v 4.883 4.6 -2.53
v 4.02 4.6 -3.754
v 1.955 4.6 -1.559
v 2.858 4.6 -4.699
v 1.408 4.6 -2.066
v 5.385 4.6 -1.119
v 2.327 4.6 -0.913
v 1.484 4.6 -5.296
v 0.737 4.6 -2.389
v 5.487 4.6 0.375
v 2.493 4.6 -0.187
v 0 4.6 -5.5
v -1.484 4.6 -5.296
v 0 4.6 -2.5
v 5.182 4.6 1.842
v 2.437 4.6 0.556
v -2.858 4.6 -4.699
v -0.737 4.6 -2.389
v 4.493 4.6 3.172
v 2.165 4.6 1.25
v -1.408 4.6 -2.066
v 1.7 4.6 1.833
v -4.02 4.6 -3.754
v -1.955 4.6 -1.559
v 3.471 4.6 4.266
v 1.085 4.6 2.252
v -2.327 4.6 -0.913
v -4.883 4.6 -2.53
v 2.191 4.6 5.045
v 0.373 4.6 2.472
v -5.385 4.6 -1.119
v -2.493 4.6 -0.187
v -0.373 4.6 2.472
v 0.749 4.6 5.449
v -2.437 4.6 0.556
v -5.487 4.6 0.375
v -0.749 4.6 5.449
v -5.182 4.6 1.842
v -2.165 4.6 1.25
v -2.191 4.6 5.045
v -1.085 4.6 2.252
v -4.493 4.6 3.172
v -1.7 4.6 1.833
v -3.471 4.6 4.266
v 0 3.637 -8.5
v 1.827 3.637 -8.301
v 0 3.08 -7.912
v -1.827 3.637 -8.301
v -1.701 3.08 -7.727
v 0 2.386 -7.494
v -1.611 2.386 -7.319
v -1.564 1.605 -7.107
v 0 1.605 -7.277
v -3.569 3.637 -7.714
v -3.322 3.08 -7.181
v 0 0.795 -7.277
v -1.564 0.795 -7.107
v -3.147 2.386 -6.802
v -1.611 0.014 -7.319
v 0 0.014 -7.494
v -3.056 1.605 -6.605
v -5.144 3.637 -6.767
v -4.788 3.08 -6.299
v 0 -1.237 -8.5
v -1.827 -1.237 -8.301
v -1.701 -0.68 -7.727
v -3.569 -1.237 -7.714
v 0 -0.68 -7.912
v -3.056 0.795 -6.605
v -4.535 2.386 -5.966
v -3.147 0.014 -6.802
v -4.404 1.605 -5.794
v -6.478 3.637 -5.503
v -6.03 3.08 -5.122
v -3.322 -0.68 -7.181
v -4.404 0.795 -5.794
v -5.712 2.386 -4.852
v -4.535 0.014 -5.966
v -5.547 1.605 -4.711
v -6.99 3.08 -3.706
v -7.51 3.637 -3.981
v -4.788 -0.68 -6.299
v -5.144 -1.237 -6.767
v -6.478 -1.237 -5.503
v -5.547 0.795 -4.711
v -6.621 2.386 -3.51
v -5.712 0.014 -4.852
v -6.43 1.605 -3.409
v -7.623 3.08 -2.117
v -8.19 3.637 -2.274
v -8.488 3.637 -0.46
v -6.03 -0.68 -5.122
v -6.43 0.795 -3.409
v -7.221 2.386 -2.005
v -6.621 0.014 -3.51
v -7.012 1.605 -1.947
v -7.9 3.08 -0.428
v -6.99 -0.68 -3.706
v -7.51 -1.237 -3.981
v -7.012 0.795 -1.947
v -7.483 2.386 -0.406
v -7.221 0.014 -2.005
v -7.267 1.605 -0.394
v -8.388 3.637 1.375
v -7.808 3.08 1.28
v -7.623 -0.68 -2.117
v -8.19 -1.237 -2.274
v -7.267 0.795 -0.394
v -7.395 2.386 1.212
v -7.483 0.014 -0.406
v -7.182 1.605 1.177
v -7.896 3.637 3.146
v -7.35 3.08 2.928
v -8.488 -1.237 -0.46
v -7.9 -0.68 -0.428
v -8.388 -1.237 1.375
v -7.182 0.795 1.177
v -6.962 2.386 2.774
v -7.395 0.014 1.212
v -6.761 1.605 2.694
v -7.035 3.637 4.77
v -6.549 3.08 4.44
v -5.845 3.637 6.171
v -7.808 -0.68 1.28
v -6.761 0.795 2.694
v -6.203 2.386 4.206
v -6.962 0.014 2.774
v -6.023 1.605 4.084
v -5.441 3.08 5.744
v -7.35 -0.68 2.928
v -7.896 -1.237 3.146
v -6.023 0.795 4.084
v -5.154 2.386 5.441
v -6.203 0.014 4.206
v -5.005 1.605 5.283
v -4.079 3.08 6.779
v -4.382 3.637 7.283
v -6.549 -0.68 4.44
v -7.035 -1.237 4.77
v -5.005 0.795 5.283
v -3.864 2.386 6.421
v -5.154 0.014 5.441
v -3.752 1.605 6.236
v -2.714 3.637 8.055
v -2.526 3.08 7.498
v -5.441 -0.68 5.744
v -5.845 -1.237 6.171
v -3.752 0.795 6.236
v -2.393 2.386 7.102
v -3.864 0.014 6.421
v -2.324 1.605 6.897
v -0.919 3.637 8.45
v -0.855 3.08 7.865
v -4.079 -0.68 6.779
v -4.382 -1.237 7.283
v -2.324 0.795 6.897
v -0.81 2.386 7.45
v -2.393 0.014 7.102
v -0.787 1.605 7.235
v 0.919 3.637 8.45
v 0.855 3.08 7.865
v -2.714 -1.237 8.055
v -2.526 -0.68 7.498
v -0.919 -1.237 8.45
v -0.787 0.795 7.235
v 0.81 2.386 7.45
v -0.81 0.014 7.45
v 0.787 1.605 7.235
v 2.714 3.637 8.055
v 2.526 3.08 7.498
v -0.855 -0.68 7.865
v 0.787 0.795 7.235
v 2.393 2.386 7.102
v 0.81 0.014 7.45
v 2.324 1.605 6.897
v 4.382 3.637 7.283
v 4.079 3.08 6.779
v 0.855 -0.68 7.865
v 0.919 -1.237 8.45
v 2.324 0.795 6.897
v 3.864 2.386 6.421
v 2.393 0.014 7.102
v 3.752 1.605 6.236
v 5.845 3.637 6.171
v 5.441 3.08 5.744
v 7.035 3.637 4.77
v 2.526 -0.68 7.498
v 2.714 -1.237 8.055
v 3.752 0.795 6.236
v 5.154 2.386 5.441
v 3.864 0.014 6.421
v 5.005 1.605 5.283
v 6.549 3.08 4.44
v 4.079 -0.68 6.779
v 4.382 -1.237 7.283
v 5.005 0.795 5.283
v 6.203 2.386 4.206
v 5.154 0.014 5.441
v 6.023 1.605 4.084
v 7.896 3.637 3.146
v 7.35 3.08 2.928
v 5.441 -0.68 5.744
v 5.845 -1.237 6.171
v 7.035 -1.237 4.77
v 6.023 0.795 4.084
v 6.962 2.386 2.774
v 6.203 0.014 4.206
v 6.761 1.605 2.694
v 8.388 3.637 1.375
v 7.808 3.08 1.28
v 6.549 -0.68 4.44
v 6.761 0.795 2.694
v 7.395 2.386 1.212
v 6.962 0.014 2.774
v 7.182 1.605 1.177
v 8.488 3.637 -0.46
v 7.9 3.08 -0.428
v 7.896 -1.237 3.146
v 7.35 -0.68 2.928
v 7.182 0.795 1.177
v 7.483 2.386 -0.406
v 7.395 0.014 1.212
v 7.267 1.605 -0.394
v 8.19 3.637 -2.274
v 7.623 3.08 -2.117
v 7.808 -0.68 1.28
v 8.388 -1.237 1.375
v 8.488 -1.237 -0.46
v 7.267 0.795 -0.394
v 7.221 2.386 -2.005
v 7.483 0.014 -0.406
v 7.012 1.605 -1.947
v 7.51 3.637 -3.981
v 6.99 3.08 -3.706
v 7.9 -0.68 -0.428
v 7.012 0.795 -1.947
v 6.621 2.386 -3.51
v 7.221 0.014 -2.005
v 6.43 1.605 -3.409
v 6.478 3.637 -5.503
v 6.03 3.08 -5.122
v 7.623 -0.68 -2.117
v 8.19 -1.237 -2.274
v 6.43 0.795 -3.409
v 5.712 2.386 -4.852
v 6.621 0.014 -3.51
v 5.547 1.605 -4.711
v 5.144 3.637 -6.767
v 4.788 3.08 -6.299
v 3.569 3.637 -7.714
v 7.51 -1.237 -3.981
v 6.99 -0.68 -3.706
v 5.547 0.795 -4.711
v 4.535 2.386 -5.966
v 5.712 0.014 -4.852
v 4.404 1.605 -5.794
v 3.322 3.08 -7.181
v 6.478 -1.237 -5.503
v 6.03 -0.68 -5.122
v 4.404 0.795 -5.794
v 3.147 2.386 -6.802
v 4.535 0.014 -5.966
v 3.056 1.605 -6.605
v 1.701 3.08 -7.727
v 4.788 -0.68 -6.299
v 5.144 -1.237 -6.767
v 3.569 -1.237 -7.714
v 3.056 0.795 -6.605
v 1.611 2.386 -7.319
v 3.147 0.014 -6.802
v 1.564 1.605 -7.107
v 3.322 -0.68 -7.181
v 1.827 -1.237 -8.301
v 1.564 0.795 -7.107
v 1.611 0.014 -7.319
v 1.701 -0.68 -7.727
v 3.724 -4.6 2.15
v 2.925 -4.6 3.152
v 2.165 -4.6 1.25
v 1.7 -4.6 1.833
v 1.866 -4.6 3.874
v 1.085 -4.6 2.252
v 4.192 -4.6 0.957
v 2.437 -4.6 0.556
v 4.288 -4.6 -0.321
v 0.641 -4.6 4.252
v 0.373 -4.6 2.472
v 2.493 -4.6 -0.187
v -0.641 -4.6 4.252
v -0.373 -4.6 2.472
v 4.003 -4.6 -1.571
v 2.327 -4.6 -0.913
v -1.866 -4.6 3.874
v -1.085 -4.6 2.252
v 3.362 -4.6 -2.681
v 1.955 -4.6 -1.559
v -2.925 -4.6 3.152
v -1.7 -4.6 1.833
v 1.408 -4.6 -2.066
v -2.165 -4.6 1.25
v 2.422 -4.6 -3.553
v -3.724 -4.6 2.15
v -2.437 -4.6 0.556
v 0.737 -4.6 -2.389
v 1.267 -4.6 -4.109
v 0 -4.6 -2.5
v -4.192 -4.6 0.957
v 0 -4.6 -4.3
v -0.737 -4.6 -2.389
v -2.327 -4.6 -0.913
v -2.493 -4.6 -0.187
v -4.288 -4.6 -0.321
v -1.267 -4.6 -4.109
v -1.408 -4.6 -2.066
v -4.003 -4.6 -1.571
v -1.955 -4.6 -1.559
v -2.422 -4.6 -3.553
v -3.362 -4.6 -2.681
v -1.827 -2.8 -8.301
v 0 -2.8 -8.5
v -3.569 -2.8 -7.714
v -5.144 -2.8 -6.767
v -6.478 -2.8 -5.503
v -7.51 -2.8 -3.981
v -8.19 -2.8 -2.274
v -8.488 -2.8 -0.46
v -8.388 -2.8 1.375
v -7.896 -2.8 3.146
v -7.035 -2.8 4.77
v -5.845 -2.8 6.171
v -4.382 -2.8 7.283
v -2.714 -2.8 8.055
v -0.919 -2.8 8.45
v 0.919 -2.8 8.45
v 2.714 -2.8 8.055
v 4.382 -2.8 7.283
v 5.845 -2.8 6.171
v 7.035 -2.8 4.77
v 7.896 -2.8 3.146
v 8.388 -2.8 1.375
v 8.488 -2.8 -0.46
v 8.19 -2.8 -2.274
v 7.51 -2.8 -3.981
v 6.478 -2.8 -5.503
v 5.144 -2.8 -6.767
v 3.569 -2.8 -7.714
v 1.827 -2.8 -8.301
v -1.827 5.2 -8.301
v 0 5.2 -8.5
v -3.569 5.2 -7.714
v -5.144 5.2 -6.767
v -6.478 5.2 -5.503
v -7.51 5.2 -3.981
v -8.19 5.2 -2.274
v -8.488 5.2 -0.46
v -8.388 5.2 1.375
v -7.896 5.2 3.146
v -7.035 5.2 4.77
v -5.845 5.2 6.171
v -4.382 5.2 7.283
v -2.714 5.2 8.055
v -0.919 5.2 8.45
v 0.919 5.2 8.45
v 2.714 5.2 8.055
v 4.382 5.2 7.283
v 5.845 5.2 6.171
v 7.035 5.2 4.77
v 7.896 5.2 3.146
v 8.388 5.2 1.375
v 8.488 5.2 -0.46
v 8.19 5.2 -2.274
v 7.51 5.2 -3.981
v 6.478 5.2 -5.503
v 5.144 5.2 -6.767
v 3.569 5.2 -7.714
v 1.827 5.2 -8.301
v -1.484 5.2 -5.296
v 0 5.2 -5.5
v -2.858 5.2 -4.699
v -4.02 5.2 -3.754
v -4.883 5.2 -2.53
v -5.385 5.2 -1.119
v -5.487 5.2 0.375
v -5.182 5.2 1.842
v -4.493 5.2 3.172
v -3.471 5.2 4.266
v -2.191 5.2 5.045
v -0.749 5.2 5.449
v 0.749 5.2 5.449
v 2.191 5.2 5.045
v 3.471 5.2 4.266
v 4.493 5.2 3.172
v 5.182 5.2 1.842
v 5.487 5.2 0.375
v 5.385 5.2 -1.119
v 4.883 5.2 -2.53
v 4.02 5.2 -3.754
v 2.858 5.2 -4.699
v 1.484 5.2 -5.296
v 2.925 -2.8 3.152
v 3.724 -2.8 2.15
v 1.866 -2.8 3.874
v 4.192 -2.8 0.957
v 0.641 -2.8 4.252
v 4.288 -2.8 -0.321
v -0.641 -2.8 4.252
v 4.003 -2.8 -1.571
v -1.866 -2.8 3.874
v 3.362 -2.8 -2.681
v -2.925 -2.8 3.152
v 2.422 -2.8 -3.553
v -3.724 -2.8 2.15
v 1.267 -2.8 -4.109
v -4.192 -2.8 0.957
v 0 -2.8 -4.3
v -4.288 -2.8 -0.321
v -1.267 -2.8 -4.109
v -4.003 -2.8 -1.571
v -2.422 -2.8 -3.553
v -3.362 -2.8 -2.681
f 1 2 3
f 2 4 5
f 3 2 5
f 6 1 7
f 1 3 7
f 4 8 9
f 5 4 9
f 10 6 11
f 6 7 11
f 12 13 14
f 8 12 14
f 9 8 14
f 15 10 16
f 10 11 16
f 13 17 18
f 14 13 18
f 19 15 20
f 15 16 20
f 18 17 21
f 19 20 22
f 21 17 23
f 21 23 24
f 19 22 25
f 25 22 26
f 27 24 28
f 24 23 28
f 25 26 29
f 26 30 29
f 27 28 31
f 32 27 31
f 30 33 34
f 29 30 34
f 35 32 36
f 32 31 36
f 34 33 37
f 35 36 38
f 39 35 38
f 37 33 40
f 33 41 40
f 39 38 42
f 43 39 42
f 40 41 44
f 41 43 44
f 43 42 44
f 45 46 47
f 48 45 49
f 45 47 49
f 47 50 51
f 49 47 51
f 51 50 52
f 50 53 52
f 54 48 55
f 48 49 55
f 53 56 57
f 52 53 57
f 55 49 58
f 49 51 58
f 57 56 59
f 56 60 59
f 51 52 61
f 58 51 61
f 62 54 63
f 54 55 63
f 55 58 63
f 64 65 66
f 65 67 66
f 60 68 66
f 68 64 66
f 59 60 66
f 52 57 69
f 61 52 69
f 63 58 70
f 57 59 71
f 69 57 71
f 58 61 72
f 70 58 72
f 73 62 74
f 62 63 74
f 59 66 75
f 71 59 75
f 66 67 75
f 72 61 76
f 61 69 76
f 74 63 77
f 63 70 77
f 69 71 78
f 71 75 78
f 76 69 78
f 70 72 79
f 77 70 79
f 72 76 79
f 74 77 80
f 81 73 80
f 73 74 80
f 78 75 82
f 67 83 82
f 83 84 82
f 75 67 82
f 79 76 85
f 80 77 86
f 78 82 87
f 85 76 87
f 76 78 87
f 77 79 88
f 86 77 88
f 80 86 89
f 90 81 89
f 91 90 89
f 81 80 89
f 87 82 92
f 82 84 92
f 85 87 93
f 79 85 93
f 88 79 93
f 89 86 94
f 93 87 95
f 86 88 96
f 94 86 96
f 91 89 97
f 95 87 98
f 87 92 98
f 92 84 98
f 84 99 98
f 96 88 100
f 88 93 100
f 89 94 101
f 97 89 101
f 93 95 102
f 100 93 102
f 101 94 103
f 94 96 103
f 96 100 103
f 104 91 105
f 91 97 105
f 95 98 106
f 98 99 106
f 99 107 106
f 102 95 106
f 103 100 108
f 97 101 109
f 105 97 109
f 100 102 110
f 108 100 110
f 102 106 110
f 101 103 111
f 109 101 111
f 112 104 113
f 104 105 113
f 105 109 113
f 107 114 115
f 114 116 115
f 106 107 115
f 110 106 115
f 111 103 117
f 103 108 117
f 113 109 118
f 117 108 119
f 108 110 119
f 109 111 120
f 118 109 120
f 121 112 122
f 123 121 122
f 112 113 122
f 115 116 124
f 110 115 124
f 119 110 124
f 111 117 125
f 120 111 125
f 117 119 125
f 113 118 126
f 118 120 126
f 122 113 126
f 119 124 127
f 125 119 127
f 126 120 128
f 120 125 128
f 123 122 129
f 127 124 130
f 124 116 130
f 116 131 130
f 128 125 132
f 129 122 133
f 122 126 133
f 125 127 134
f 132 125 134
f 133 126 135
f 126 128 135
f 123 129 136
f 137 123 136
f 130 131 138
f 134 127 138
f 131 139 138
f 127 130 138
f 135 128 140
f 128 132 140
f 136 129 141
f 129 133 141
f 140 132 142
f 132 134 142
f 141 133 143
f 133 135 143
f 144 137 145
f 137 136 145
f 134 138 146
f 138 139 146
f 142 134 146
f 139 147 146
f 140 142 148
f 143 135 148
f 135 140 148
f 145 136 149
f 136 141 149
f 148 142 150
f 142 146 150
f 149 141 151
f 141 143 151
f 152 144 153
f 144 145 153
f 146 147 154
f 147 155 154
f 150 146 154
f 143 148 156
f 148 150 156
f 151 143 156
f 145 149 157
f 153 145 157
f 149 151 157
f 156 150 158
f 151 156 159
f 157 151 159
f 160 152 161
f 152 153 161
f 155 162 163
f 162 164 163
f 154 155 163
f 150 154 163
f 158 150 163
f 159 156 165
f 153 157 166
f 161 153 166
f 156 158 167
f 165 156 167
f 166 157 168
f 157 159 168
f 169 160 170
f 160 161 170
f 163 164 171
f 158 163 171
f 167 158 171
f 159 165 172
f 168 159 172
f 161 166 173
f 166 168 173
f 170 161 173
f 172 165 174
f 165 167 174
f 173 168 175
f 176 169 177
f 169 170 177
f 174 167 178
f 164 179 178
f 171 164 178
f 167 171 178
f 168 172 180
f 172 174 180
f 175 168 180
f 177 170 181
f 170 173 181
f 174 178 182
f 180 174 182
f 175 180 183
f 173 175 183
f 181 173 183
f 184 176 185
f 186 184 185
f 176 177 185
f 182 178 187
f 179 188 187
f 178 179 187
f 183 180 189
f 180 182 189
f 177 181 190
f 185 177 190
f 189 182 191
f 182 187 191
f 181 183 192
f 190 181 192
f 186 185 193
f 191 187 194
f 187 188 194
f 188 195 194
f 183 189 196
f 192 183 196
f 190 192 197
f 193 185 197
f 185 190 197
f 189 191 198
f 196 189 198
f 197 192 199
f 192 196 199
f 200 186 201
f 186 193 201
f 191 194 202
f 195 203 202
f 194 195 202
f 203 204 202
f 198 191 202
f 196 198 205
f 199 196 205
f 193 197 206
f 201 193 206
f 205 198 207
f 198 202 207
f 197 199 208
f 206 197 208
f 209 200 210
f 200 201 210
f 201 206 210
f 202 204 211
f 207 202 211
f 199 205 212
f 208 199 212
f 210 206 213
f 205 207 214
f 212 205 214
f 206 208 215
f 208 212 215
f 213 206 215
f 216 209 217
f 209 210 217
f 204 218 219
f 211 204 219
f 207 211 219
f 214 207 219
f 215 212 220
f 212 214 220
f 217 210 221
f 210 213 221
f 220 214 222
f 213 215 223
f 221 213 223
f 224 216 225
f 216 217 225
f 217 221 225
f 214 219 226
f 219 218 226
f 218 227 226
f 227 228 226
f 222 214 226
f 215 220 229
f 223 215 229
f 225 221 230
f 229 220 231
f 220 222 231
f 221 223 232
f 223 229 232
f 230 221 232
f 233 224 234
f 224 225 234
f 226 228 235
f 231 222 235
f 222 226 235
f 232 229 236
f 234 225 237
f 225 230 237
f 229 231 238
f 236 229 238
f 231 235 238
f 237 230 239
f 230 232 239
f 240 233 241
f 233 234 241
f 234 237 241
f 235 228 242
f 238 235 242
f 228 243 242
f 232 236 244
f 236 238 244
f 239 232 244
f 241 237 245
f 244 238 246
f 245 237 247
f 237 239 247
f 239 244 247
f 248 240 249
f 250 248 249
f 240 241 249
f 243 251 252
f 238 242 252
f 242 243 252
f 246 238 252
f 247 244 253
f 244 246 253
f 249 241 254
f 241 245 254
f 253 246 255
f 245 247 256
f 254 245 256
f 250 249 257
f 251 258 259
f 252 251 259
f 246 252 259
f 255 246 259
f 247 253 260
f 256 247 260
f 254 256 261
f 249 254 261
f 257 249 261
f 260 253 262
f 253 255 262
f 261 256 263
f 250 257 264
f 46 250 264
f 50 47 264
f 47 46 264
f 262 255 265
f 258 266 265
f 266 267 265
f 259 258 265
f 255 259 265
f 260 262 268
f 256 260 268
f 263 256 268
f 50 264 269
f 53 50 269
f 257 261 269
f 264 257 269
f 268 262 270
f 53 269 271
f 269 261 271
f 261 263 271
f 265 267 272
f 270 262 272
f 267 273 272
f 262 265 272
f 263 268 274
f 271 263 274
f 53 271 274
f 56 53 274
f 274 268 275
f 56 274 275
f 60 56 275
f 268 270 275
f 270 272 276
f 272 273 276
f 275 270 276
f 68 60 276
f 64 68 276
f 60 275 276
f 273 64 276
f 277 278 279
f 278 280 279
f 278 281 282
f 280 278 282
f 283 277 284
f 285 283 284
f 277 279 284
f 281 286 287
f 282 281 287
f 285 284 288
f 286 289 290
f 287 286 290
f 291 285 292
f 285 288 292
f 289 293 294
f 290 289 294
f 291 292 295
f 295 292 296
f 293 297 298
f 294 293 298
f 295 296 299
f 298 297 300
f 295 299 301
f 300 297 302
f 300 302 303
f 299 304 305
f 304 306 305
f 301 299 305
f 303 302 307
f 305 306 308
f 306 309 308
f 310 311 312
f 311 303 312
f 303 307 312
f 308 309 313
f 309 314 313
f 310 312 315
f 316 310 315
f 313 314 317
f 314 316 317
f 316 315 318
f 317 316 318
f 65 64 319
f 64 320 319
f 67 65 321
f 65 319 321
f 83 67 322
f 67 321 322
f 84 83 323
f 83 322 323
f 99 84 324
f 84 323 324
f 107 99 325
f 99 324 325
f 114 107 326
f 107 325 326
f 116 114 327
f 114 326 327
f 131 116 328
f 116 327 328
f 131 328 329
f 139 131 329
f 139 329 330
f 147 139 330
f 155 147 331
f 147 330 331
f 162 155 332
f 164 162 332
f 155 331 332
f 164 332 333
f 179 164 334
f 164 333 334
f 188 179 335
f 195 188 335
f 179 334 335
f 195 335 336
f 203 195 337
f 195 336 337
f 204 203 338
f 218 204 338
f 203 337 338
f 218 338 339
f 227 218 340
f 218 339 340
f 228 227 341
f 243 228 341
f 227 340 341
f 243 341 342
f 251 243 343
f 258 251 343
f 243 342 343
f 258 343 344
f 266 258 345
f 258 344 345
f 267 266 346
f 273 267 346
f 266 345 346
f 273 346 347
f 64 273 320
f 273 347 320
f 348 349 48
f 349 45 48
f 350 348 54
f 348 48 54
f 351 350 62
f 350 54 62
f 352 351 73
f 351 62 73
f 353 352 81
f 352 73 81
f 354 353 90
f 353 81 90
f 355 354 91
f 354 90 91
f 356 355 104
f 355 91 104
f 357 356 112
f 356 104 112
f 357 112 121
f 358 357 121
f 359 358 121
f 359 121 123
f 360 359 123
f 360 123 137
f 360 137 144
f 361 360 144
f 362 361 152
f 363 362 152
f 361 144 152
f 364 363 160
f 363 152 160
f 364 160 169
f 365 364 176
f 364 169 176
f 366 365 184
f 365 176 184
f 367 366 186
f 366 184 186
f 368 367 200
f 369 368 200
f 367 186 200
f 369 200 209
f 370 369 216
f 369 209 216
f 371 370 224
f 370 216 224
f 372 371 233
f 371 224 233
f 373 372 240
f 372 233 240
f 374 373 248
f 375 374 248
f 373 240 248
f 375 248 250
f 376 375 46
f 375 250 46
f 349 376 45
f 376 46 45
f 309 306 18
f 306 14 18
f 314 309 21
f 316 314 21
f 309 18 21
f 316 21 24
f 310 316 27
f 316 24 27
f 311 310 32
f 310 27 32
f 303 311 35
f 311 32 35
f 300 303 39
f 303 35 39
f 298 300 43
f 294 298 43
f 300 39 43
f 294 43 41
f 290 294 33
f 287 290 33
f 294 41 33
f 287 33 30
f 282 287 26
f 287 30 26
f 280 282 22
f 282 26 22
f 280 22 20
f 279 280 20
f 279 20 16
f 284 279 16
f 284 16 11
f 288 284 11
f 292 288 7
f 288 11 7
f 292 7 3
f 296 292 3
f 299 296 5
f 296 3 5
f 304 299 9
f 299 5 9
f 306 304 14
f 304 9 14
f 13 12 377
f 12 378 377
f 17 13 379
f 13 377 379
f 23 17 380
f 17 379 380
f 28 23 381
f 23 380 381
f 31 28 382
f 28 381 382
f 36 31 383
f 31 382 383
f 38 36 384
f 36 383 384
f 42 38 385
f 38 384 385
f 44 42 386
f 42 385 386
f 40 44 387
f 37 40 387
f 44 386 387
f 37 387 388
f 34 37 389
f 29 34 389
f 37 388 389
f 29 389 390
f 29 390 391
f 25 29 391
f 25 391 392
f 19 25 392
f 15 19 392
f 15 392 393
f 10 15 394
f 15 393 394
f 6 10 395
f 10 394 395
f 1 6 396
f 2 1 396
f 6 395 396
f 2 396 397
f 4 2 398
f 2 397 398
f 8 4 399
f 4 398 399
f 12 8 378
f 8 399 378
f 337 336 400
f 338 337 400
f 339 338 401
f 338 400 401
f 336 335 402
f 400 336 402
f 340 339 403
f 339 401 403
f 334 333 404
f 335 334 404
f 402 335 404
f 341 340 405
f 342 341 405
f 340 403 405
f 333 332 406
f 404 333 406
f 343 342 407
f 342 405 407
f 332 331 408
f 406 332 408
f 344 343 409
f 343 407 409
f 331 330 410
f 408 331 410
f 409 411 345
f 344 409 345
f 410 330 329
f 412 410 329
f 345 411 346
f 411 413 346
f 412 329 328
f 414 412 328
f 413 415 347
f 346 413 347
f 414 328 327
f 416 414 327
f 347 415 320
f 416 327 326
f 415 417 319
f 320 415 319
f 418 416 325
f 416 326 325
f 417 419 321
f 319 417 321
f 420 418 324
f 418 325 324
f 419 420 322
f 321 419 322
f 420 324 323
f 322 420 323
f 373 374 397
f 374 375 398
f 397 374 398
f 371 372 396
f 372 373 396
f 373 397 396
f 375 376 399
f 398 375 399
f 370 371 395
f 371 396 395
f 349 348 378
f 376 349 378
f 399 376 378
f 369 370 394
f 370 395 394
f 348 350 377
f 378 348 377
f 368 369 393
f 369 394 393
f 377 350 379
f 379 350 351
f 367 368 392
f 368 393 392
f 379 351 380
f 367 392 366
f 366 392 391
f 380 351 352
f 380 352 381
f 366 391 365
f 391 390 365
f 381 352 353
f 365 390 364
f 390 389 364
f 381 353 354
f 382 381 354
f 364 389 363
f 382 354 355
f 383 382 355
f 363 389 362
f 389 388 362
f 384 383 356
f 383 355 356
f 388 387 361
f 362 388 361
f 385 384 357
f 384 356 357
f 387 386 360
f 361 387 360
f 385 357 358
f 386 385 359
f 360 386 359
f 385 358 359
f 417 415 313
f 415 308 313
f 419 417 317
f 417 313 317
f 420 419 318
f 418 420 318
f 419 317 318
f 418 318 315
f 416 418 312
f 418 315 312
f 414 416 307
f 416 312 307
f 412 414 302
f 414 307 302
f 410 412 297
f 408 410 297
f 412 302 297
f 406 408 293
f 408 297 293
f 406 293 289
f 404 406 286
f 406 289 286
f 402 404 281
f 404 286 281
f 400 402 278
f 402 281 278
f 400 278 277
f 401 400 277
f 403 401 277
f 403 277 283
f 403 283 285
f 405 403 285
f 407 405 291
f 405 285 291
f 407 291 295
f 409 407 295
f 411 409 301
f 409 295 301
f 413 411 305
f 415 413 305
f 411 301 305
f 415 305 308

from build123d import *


with BuildPart() as part:
    # Эскиз1 → Повернуть1 (revolve)
    with BuildSketch(Plane.XY, mode=Mode.PRIVATE) as revolve_1_sk:
        with BuildLine():
            Line((2.5, -4.6), (2.5, 4.6))
            Line((2.5, 4.6), (5.5, 4.6))
            Line((5.5, 4.6), (5.5, 5.2))
            Line((5.5, 5.2), (8.5, 5.2))
            Line((8.5, 5.2), (8.5, 3.636698586))
            ThreePointArc((8.5, 3.636698586), (7.25, 1.2), (8.5, -1.236698586))
            Line((8.5, -1.236698586), (8.5, -2.8))
            Line((8.5, -2.8), (4.3, -2.8))
            Line((4.3, -2.8), (4.3, -4.6))
            Line((4.3, -4.6), (2.5, -4.6))
        make_face()
    revolve(revolve_1_sk.sketch.rotate(Axis((0, 0, 0), (0, 1, 0)), 90), axis=Axis((0, 0, 0), (0, 1, 0)))


solid = part.part
